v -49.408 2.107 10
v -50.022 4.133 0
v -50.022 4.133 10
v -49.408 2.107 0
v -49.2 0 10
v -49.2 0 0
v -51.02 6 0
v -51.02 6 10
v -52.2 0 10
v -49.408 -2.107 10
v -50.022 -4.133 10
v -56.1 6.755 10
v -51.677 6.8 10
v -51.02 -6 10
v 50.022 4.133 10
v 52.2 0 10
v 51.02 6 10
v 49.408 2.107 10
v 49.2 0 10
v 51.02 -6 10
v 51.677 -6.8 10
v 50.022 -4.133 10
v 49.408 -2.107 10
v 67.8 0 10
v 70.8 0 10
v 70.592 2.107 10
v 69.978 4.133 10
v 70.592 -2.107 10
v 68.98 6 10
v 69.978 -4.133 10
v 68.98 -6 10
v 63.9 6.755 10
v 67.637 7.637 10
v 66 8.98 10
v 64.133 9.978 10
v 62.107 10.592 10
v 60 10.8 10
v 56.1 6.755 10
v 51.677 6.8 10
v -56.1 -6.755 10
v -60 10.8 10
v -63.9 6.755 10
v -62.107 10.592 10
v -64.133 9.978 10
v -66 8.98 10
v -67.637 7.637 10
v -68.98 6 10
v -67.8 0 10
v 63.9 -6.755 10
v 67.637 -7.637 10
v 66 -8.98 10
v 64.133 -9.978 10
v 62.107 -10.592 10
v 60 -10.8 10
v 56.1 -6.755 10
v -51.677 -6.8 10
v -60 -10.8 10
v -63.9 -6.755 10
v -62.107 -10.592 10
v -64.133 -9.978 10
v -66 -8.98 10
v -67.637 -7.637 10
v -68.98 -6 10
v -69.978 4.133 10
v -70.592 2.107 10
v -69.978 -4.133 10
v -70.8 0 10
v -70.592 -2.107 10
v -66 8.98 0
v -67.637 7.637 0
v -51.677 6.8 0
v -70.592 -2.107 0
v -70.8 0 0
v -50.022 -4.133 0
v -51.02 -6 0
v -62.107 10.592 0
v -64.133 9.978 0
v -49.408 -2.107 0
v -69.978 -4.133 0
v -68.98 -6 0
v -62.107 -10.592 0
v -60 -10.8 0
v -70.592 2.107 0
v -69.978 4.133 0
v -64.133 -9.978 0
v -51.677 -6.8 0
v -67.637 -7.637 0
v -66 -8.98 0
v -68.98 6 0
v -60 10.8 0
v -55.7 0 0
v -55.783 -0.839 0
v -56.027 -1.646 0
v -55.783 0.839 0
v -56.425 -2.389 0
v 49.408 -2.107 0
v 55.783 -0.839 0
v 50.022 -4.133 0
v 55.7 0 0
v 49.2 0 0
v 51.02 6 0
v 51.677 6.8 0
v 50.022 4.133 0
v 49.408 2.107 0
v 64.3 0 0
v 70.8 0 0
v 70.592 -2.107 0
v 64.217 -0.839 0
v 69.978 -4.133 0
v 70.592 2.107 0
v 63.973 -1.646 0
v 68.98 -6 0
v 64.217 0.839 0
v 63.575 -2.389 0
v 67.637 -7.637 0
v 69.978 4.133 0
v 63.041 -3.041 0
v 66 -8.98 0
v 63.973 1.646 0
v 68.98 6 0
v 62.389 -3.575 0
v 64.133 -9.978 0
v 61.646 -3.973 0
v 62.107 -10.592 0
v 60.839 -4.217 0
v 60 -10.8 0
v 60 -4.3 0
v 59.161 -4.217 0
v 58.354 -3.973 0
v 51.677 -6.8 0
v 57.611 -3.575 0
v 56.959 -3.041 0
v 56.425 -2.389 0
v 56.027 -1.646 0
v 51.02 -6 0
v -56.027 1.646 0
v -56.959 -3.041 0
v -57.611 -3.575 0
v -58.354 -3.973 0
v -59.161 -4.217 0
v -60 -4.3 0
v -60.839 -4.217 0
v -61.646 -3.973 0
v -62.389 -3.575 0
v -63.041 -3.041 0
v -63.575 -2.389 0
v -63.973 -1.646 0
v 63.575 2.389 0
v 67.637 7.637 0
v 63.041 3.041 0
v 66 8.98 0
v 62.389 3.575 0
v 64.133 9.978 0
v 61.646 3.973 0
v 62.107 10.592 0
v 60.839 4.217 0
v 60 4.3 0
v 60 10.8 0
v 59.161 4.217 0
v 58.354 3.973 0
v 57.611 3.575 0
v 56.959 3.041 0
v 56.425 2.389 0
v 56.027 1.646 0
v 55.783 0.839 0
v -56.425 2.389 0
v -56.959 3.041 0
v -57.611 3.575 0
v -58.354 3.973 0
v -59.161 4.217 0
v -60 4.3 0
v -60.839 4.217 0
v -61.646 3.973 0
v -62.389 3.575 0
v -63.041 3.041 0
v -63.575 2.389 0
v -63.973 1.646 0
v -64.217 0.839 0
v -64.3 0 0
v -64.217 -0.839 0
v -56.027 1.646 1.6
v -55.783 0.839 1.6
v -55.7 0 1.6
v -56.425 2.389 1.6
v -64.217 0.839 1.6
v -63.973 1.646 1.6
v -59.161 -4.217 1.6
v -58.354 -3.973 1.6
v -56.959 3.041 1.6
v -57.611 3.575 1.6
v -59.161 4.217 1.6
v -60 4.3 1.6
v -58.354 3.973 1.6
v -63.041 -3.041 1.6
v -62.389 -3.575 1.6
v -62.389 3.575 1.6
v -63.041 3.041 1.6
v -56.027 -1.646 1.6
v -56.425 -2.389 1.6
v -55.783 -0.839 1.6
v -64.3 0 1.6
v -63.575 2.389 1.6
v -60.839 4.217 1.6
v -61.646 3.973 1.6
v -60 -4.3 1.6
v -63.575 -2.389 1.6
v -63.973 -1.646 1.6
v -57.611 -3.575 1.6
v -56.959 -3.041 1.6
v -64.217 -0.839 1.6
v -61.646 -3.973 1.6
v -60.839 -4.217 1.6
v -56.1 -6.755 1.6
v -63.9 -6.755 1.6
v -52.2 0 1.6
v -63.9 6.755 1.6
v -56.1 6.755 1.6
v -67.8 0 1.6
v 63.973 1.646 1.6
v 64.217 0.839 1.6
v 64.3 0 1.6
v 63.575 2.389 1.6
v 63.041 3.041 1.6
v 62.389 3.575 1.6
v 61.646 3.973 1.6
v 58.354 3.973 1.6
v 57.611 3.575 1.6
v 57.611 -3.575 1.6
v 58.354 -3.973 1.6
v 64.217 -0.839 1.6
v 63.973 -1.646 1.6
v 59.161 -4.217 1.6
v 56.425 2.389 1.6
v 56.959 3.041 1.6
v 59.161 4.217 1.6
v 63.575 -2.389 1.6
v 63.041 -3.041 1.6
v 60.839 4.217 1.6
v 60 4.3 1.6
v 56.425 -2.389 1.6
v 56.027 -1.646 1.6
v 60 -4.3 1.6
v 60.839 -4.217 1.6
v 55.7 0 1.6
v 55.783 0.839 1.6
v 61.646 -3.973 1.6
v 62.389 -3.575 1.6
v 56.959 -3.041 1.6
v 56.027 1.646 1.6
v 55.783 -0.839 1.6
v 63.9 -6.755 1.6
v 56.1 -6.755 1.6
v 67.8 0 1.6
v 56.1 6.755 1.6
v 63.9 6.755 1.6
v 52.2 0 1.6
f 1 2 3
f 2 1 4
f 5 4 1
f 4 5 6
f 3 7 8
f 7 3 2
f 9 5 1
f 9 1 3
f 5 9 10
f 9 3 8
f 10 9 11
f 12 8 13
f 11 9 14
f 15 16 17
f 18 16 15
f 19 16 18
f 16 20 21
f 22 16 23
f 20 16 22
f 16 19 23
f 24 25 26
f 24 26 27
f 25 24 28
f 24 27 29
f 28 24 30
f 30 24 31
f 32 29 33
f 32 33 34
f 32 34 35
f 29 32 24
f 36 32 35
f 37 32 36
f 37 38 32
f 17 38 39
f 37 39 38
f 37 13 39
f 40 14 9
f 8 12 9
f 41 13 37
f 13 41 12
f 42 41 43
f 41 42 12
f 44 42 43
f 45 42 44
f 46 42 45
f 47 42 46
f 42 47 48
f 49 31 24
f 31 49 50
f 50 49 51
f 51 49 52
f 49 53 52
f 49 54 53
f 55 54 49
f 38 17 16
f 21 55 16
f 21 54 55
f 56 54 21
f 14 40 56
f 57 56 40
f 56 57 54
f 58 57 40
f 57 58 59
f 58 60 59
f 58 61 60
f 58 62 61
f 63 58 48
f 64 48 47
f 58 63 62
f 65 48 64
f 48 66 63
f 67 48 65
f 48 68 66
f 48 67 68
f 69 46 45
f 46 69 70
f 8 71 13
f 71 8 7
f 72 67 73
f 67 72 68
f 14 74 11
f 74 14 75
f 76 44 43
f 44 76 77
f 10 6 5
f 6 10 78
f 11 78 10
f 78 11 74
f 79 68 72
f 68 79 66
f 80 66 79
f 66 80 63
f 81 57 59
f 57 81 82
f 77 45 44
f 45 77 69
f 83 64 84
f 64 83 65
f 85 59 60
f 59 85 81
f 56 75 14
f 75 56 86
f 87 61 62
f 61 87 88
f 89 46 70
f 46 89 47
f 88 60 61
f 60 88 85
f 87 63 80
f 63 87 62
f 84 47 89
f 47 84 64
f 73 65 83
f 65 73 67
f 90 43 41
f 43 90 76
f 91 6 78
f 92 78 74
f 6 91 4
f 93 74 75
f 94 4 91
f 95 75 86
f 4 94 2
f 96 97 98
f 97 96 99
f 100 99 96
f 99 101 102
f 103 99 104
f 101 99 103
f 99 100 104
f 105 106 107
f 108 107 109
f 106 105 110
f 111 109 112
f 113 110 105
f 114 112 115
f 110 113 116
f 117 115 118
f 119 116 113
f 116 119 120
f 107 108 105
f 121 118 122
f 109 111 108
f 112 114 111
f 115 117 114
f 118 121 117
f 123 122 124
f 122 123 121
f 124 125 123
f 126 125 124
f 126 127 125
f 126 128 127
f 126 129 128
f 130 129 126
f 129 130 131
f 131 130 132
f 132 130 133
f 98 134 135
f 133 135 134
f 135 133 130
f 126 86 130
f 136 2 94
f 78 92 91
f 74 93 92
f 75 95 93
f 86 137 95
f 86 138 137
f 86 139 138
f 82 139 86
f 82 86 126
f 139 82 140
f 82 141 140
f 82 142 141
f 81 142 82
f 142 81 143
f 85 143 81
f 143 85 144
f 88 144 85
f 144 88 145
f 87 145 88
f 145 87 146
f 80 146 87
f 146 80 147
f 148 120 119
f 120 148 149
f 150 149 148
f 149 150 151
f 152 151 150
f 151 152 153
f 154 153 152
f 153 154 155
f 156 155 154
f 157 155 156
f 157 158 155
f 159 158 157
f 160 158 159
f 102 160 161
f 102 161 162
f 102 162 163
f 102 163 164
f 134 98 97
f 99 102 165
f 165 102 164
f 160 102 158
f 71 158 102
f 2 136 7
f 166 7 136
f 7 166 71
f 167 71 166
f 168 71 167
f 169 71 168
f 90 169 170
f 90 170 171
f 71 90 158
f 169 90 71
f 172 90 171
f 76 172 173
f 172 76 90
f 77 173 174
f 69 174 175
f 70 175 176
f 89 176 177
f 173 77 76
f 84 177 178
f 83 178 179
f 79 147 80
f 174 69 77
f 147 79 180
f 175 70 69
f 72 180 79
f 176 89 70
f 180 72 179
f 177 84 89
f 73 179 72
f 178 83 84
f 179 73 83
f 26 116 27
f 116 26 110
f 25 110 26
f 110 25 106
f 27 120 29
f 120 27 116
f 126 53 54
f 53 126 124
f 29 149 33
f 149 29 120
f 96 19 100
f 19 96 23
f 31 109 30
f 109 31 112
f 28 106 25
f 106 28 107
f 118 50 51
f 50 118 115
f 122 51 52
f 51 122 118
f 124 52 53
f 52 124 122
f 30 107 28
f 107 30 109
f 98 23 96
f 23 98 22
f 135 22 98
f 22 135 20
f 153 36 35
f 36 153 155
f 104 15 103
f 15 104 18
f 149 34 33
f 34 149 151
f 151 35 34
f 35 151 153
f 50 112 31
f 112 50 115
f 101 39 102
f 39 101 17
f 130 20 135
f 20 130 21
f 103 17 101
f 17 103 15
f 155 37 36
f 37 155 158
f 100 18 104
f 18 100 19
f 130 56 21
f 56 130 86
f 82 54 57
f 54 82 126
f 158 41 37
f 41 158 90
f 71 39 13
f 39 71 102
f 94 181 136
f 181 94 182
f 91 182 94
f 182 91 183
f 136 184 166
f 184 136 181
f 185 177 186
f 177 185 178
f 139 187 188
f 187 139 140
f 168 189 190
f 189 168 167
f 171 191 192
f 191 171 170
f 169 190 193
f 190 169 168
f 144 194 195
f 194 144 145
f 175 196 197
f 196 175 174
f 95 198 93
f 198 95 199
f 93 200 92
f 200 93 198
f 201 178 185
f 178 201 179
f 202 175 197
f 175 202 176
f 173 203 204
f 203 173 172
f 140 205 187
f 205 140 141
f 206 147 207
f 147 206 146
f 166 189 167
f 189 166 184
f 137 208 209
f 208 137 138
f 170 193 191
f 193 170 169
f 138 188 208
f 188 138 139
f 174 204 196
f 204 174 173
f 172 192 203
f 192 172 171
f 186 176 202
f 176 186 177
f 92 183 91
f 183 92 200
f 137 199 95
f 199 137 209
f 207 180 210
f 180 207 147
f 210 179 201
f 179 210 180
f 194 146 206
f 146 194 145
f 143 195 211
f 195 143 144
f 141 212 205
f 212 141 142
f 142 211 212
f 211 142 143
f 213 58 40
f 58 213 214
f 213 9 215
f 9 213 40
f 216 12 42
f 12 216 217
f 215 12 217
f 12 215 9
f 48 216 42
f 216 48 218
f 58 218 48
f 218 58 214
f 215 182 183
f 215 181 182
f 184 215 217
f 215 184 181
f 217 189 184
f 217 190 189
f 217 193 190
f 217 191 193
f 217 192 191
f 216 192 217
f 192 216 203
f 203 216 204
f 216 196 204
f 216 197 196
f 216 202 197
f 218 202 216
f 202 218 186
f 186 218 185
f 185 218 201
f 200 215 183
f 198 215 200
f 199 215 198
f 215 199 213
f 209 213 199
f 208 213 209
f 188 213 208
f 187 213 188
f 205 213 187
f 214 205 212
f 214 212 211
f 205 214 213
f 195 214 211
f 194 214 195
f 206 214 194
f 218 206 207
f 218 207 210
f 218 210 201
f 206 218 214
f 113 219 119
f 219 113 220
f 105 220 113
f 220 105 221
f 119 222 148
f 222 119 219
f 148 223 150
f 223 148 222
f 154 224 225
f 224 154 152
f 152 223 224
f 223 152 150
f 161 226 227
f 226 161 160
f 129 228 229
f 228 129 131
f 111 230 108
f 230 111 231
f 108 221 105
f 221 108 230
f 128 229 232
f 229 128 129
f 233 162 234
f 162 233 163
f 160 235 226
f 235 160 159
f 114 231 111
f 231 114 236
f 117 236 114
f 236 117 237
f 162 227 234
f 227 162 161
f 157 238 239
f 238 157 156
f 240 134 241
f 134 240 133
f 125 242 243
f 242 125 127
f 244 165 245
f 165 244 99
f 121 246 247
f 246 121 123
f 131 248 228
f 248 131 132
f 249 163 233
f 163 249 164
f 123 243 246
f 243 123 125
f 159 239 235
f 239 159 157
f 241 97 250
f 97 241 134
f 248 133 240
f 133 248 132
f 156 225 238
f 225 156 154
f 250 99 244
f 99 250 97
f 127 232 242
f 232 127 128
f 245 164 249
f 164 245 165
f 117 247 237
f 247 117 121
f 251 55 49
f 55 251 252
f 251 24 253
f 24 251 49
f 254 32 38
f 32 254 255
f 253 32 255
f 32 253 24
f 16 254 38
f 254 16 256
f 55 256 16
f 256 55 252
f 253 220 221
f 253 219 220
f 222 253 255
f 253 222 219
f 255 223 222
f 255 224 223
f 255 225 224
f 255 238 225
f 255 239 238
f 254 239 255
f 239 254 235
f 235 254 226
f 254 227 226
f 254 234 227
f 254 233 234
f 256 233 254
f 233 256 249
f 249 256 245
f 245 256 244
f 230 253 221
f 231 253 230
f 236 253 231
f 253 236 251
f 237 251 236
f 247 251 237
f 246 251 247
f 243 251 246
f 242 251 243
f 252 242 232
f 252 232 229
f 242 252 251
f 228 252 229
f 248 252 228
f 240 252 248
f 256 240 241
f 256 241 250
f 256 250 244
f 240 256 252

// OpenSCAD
// file: SpoolholderVars.scad
screwM3Diameter=3+0.4;
screwM3HolderDiameter=screwM3Diameter+2*2;
screwM3HolderRadius=screwM3HolderDiameter/2;
nutM3Height=2;
screw16M3Height=16;
screw30M3Height=30;

rodM8Diameter=8+0.6;
nutM8Diameter=14.4+1.2;
nutM8Height=6.4+1.0;

nutM8HolderDiameter=nutM8Diameter+2*3;
nutM8HolderRadius=nutM8HolderDiameter/2;


length=120;
bottomHeight=10;
topHeight=8;
topWidth=16;
connectorThickness=4;
bottomNutM8HoleHeight=nutM8Height+1.0;


bearingDiameter=28+0.8;
bearingHolderWallThickness=3;
bearingHolderDiameter=bearingDiameter+2*bearingHolderWallThickness;
bearingHolderRadius=bearingHolderDiameter/2;

bearingHolderLength=bearingHolderDiameter+2*screwM3HolderDiameter;
bearingHolderHoleDiameter=18;
bearingHolderBottomHeight=4;
bearingHolderScrewOffset=(bearingHolderLength-screwM3HolderDiameter)/2;
bearingHolderScrewHolderHeight=screw16M3Height-nutM3Height-topHeight;


coneHeight=5;
coneBigDiameter=56;
coneBigRadius=coneBigDiameter/2;
coneSmallDiameter=48;
coneSmallRadius=coneSmallDiameter/2;

coneNutHolderHoleDiameter=16;
coneNutHolderHoleRadius=coneNutHolderHoleDiameter/2;
coneNutHolderWallThickness=4;
coneNutHolderWithWallDiameter=coneNutHolderHoleDiameter+2*coneNutHolderWallThickness;
coneNutHolderScrewOffset=coneNutHolderHoleRadius+screwM3HolderRadius;
coneNutHolderBottomHeight=3;
coneNutHolderTotalHeight=screw30M3Height-nutM3Height-coneHeight;
coneNutHolderNutM8HoleHeight=nutM8Height-1.0;
// main file
include <SpoolholderVars.scad>

difference()
{
	union()
	{
		//Nut holders (cylinders):
		for(t=[-1,1])
		{
			translate([t*length/2,0,0])
			cylinder(d=nutM8HolderDiameter,h=bottomHeight,$fn=32);
		}
		
		//Connectors:
		for(y=[-nutM8HolderRadius,nutM8HolderRadius-connectorThickness])
		{
			translate([-length/2,y,0])
			cube([length,connectorThickness,bottomHeight]);
		}
	}
	
	for(t=[-1,1])
	{
		//Holes for M8 rod:
		translate([t*length/2,0,-1])
		cylinder(d=rodM8Diameter,h=bottomHeight+2,$fn=32);
		
		//Holes for M8 nuts:
		translate([t*length/2,0,bottomHeight-bottomNutM8HoleHeight])
		cylinder(d=nutM8Diameter,h=bottomNutM8HoleHeight+1,$fn=6);
	}
}
